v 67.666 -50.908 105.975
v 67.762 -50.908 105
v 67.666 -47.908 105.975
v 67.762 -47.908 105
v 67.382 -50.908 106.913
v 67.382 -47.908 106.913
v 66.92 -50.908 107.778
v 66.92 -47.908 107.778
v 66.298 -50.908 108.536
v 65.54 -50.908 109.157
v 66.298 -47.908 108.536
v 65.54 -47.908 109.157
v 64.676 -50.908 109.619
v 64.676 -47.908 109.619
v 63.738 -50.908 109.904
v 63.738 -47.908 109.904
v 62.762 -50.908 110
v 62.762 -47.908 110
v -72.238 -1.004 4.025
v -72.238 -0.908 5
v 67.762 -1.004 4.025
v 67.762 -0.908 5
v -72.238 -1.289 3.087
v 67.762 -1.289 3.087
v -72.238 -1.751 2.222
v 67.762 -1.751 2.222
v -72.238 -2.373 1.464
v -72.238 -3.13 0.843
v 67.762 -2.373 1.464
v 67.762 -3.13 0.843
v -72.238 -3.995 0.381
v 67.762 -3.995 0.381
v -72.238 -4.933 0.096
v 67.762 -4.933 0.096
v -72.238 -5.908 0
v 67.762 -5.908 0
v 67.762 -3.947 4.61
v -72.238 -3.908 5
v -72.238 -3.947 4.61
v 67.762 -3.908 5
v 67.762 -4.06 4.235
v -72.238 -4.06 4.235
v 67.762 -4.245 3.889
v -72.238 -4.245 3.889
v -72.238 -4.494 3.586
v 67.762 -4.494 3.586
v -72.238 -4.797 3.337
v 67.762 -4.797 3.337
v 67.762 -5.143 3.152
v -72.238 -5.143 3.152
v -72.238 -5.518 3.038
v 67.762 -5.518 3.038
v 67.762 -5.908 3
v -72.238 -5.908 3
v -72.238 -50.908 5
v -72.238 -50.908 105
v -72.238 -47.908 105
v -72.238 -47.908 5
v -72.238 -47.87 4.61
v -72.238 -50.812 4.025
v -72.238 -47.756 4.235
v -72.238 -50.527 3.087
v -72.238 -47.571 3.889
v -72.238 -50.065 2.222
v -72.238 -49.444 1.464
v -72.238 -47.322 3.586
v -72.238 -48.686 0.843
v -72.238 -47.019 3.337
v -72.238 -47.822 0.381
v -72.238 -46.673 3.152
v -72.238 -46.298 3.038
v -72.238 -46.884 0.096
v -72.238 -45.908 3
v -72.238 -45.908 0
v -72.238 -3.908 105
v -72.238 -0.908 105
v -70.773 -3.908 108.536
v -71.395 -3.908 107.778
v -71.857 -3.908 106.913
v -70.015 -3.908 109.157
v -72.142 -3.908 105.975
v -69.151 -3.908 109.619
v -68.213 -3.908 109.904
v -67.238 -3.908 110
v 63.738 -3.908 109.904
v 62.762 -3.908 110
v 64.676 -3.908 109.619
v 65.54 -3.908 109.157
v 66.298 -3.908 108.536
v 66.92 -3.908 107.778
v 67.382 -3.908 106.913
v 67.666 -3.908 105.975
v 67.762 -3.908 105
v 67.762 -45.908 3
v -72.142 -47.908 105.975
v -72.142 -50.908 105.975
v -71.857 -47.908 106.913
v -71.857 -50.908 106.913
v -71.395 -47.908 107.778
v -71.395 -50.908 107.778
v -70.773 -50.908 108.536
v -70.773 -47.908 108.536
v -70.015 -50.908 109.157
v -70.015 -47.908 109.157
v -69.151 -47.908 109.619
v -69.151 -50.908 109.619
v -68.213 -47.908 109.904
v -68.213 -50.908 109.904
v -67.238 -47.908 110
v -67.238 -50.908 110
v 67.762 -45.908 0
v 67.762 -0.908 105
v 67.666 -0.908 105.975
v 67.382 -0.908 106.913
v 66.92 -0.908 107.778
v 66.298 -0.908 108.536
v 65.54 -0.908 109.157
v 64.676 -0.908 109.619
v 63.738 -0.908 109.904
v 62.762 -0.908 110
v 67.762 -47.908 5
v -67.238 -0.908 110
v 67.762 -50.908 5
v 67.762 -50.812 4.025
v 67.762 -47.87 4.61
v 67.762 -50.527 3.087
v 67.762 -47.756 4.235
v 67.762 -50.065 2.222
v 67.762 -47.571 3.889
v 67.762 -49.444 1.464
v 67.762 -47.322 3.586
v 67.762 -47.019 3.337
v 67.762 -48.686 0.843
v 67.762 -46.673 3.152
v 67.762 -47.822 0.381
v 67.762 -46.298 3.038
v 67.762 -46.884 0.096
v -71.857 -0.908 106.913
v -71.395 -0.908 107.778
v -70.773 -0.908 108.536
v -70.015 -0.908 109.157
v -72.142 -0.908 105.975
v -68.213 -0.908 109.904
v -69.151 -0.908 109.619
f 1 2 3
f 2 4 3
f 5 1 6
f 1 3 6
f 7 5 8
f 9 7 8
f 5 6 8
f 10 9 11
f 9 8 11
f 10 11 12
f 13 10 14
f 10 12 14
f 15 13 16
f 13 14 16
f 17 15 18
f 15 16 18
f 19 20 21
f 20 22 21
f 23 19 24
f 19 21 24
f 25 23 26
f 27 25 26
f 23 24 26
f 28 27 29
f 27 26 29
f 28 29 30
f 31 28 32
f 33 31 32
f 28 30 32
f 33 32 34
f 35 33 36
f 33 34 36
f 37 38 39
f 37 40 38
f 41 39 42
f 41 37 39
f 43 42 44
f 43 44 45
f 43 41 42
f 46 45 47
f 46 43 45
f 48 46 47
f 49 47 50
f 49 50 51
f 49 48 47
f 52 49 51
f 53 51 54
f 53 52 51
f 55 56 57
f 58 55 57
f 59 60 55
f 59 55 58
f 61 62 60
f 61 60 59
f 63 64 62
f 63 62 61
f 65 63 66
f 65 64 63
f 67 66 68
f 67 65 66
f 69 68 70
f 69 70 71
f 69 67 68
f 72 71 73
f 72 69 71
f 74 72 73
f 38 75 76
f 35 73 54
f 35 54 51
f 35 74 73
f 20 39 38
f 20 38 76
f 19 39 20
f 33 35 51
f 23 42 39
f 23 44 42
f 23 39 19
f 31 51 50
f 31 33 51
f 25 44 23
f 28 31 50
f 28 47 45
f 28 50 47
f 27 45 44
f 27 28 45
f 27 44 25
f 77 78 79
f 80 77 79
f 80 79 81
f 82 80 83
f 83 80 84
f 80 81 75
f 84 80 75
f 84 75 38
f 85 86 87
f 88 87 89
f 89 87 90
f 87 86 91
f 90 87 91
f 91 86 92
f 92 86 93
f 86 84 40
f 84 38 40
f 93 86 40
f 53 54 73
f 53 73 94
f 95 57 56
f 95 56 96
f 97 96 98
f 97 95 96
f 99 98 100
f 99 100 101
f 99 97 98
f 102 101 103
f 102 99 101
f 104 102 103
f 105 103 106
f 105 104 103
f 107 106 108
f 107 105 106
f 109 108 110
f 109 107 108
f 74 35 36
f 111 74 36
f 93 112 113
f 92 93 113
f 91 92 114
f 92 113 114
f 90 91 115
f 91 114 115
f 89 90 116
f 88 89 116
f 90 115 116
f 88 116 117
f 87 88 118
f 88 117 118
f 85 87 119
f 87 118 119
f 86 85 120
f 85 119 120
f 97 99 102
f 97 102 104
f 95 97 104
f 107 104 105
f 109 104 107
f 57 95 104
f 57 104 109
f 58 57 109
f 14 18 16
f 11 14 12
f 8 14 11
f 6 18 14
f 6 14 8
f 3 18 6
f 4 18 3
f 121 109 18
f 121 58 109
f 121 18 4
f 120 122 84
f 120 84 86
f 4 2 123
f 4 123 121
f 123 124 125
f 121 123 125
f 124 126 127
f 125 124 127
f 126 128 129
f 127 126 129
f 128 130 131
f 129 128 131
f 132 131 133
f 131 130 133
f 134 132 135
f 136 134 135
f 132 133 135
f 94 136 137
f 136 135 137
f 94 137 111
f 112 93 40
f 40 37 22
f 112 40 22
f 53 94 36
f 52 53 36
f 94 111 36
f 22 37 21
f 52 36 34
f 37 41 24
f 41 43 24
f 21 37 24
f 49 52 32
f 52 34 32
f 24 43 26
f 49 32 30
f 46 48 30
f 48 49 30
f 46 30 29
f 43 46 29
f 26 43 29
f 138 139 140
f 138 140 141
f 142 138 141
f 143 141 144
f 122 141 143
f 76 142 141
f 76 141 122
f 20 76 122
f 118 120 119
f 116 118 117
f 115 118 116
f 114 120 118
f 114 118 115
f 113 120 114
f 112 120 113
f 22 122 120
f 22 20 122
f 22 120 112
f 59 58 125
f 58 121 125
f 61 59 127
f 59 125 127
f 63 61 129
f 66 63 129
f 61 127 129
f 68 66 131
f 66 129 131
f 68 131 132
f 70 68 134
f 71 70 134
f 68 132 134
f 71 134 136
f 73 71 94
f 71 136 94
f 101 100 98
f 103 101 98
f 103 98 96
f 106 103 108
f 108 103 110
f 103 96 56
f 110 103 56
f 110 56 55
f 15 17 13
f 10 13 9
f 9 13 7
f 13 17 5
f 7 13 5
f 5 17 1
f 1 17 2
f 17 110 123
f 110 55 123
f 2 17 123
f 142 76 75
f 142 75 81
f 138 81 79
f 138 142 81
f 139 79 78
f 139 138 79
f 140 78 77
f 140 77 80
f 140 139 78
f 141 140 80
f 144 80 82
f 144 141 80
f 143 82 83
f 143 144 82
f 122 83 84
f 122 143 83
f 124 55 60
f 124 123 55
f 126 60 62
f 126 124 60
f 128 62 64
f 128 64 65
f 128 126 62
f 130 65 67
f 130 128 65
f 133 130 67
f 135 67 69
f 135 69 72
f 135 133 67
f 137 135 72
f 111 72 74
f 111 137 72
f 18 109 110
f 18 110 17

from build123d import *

# Parameters (mm, degrees)
F0_W     = 140
F0_H     = 50
F1_DEPTH = 110
F2_R     = 5
F3_T     = -3


with BuildPart() as f1:
    # F0 (on Top) → F1 (new body)
    with BuildSketch(Plane.XY):
        with Locations((-2.237636596, -25.9080916599)):
            Rectangle(F0_W, F0_H)
    extrude(amount=F1_DEPTH)

    # F2
    f2_edges = [f1.edges().sort_by_distance(p)[0] for p in [
        (-72.237637, -25.908092, 110),
        (67.762363, -25.908092, 110),
        (-2.237637, -50.908092, 0),
        (-2.237637, -0.908092, 0),
    ]]
    fillet(f2_edges, radius=F2_R)

    # F3
    f3_openings = [f1.faces().sort_by_distance(p)[0] for p in [
        (67.762363, -25.908092, 52.605233),
        (66.297897, -25.908092, 108.535534),
        (-2.237637, -25.908092, 110),
        (-70.773171, -25.908092, 108.535534),
        (-72.237637, -25.908092, 52.605233),
    ]]
    offset(amount=F3_T, openings=f3_openings)


solid = f1.part
